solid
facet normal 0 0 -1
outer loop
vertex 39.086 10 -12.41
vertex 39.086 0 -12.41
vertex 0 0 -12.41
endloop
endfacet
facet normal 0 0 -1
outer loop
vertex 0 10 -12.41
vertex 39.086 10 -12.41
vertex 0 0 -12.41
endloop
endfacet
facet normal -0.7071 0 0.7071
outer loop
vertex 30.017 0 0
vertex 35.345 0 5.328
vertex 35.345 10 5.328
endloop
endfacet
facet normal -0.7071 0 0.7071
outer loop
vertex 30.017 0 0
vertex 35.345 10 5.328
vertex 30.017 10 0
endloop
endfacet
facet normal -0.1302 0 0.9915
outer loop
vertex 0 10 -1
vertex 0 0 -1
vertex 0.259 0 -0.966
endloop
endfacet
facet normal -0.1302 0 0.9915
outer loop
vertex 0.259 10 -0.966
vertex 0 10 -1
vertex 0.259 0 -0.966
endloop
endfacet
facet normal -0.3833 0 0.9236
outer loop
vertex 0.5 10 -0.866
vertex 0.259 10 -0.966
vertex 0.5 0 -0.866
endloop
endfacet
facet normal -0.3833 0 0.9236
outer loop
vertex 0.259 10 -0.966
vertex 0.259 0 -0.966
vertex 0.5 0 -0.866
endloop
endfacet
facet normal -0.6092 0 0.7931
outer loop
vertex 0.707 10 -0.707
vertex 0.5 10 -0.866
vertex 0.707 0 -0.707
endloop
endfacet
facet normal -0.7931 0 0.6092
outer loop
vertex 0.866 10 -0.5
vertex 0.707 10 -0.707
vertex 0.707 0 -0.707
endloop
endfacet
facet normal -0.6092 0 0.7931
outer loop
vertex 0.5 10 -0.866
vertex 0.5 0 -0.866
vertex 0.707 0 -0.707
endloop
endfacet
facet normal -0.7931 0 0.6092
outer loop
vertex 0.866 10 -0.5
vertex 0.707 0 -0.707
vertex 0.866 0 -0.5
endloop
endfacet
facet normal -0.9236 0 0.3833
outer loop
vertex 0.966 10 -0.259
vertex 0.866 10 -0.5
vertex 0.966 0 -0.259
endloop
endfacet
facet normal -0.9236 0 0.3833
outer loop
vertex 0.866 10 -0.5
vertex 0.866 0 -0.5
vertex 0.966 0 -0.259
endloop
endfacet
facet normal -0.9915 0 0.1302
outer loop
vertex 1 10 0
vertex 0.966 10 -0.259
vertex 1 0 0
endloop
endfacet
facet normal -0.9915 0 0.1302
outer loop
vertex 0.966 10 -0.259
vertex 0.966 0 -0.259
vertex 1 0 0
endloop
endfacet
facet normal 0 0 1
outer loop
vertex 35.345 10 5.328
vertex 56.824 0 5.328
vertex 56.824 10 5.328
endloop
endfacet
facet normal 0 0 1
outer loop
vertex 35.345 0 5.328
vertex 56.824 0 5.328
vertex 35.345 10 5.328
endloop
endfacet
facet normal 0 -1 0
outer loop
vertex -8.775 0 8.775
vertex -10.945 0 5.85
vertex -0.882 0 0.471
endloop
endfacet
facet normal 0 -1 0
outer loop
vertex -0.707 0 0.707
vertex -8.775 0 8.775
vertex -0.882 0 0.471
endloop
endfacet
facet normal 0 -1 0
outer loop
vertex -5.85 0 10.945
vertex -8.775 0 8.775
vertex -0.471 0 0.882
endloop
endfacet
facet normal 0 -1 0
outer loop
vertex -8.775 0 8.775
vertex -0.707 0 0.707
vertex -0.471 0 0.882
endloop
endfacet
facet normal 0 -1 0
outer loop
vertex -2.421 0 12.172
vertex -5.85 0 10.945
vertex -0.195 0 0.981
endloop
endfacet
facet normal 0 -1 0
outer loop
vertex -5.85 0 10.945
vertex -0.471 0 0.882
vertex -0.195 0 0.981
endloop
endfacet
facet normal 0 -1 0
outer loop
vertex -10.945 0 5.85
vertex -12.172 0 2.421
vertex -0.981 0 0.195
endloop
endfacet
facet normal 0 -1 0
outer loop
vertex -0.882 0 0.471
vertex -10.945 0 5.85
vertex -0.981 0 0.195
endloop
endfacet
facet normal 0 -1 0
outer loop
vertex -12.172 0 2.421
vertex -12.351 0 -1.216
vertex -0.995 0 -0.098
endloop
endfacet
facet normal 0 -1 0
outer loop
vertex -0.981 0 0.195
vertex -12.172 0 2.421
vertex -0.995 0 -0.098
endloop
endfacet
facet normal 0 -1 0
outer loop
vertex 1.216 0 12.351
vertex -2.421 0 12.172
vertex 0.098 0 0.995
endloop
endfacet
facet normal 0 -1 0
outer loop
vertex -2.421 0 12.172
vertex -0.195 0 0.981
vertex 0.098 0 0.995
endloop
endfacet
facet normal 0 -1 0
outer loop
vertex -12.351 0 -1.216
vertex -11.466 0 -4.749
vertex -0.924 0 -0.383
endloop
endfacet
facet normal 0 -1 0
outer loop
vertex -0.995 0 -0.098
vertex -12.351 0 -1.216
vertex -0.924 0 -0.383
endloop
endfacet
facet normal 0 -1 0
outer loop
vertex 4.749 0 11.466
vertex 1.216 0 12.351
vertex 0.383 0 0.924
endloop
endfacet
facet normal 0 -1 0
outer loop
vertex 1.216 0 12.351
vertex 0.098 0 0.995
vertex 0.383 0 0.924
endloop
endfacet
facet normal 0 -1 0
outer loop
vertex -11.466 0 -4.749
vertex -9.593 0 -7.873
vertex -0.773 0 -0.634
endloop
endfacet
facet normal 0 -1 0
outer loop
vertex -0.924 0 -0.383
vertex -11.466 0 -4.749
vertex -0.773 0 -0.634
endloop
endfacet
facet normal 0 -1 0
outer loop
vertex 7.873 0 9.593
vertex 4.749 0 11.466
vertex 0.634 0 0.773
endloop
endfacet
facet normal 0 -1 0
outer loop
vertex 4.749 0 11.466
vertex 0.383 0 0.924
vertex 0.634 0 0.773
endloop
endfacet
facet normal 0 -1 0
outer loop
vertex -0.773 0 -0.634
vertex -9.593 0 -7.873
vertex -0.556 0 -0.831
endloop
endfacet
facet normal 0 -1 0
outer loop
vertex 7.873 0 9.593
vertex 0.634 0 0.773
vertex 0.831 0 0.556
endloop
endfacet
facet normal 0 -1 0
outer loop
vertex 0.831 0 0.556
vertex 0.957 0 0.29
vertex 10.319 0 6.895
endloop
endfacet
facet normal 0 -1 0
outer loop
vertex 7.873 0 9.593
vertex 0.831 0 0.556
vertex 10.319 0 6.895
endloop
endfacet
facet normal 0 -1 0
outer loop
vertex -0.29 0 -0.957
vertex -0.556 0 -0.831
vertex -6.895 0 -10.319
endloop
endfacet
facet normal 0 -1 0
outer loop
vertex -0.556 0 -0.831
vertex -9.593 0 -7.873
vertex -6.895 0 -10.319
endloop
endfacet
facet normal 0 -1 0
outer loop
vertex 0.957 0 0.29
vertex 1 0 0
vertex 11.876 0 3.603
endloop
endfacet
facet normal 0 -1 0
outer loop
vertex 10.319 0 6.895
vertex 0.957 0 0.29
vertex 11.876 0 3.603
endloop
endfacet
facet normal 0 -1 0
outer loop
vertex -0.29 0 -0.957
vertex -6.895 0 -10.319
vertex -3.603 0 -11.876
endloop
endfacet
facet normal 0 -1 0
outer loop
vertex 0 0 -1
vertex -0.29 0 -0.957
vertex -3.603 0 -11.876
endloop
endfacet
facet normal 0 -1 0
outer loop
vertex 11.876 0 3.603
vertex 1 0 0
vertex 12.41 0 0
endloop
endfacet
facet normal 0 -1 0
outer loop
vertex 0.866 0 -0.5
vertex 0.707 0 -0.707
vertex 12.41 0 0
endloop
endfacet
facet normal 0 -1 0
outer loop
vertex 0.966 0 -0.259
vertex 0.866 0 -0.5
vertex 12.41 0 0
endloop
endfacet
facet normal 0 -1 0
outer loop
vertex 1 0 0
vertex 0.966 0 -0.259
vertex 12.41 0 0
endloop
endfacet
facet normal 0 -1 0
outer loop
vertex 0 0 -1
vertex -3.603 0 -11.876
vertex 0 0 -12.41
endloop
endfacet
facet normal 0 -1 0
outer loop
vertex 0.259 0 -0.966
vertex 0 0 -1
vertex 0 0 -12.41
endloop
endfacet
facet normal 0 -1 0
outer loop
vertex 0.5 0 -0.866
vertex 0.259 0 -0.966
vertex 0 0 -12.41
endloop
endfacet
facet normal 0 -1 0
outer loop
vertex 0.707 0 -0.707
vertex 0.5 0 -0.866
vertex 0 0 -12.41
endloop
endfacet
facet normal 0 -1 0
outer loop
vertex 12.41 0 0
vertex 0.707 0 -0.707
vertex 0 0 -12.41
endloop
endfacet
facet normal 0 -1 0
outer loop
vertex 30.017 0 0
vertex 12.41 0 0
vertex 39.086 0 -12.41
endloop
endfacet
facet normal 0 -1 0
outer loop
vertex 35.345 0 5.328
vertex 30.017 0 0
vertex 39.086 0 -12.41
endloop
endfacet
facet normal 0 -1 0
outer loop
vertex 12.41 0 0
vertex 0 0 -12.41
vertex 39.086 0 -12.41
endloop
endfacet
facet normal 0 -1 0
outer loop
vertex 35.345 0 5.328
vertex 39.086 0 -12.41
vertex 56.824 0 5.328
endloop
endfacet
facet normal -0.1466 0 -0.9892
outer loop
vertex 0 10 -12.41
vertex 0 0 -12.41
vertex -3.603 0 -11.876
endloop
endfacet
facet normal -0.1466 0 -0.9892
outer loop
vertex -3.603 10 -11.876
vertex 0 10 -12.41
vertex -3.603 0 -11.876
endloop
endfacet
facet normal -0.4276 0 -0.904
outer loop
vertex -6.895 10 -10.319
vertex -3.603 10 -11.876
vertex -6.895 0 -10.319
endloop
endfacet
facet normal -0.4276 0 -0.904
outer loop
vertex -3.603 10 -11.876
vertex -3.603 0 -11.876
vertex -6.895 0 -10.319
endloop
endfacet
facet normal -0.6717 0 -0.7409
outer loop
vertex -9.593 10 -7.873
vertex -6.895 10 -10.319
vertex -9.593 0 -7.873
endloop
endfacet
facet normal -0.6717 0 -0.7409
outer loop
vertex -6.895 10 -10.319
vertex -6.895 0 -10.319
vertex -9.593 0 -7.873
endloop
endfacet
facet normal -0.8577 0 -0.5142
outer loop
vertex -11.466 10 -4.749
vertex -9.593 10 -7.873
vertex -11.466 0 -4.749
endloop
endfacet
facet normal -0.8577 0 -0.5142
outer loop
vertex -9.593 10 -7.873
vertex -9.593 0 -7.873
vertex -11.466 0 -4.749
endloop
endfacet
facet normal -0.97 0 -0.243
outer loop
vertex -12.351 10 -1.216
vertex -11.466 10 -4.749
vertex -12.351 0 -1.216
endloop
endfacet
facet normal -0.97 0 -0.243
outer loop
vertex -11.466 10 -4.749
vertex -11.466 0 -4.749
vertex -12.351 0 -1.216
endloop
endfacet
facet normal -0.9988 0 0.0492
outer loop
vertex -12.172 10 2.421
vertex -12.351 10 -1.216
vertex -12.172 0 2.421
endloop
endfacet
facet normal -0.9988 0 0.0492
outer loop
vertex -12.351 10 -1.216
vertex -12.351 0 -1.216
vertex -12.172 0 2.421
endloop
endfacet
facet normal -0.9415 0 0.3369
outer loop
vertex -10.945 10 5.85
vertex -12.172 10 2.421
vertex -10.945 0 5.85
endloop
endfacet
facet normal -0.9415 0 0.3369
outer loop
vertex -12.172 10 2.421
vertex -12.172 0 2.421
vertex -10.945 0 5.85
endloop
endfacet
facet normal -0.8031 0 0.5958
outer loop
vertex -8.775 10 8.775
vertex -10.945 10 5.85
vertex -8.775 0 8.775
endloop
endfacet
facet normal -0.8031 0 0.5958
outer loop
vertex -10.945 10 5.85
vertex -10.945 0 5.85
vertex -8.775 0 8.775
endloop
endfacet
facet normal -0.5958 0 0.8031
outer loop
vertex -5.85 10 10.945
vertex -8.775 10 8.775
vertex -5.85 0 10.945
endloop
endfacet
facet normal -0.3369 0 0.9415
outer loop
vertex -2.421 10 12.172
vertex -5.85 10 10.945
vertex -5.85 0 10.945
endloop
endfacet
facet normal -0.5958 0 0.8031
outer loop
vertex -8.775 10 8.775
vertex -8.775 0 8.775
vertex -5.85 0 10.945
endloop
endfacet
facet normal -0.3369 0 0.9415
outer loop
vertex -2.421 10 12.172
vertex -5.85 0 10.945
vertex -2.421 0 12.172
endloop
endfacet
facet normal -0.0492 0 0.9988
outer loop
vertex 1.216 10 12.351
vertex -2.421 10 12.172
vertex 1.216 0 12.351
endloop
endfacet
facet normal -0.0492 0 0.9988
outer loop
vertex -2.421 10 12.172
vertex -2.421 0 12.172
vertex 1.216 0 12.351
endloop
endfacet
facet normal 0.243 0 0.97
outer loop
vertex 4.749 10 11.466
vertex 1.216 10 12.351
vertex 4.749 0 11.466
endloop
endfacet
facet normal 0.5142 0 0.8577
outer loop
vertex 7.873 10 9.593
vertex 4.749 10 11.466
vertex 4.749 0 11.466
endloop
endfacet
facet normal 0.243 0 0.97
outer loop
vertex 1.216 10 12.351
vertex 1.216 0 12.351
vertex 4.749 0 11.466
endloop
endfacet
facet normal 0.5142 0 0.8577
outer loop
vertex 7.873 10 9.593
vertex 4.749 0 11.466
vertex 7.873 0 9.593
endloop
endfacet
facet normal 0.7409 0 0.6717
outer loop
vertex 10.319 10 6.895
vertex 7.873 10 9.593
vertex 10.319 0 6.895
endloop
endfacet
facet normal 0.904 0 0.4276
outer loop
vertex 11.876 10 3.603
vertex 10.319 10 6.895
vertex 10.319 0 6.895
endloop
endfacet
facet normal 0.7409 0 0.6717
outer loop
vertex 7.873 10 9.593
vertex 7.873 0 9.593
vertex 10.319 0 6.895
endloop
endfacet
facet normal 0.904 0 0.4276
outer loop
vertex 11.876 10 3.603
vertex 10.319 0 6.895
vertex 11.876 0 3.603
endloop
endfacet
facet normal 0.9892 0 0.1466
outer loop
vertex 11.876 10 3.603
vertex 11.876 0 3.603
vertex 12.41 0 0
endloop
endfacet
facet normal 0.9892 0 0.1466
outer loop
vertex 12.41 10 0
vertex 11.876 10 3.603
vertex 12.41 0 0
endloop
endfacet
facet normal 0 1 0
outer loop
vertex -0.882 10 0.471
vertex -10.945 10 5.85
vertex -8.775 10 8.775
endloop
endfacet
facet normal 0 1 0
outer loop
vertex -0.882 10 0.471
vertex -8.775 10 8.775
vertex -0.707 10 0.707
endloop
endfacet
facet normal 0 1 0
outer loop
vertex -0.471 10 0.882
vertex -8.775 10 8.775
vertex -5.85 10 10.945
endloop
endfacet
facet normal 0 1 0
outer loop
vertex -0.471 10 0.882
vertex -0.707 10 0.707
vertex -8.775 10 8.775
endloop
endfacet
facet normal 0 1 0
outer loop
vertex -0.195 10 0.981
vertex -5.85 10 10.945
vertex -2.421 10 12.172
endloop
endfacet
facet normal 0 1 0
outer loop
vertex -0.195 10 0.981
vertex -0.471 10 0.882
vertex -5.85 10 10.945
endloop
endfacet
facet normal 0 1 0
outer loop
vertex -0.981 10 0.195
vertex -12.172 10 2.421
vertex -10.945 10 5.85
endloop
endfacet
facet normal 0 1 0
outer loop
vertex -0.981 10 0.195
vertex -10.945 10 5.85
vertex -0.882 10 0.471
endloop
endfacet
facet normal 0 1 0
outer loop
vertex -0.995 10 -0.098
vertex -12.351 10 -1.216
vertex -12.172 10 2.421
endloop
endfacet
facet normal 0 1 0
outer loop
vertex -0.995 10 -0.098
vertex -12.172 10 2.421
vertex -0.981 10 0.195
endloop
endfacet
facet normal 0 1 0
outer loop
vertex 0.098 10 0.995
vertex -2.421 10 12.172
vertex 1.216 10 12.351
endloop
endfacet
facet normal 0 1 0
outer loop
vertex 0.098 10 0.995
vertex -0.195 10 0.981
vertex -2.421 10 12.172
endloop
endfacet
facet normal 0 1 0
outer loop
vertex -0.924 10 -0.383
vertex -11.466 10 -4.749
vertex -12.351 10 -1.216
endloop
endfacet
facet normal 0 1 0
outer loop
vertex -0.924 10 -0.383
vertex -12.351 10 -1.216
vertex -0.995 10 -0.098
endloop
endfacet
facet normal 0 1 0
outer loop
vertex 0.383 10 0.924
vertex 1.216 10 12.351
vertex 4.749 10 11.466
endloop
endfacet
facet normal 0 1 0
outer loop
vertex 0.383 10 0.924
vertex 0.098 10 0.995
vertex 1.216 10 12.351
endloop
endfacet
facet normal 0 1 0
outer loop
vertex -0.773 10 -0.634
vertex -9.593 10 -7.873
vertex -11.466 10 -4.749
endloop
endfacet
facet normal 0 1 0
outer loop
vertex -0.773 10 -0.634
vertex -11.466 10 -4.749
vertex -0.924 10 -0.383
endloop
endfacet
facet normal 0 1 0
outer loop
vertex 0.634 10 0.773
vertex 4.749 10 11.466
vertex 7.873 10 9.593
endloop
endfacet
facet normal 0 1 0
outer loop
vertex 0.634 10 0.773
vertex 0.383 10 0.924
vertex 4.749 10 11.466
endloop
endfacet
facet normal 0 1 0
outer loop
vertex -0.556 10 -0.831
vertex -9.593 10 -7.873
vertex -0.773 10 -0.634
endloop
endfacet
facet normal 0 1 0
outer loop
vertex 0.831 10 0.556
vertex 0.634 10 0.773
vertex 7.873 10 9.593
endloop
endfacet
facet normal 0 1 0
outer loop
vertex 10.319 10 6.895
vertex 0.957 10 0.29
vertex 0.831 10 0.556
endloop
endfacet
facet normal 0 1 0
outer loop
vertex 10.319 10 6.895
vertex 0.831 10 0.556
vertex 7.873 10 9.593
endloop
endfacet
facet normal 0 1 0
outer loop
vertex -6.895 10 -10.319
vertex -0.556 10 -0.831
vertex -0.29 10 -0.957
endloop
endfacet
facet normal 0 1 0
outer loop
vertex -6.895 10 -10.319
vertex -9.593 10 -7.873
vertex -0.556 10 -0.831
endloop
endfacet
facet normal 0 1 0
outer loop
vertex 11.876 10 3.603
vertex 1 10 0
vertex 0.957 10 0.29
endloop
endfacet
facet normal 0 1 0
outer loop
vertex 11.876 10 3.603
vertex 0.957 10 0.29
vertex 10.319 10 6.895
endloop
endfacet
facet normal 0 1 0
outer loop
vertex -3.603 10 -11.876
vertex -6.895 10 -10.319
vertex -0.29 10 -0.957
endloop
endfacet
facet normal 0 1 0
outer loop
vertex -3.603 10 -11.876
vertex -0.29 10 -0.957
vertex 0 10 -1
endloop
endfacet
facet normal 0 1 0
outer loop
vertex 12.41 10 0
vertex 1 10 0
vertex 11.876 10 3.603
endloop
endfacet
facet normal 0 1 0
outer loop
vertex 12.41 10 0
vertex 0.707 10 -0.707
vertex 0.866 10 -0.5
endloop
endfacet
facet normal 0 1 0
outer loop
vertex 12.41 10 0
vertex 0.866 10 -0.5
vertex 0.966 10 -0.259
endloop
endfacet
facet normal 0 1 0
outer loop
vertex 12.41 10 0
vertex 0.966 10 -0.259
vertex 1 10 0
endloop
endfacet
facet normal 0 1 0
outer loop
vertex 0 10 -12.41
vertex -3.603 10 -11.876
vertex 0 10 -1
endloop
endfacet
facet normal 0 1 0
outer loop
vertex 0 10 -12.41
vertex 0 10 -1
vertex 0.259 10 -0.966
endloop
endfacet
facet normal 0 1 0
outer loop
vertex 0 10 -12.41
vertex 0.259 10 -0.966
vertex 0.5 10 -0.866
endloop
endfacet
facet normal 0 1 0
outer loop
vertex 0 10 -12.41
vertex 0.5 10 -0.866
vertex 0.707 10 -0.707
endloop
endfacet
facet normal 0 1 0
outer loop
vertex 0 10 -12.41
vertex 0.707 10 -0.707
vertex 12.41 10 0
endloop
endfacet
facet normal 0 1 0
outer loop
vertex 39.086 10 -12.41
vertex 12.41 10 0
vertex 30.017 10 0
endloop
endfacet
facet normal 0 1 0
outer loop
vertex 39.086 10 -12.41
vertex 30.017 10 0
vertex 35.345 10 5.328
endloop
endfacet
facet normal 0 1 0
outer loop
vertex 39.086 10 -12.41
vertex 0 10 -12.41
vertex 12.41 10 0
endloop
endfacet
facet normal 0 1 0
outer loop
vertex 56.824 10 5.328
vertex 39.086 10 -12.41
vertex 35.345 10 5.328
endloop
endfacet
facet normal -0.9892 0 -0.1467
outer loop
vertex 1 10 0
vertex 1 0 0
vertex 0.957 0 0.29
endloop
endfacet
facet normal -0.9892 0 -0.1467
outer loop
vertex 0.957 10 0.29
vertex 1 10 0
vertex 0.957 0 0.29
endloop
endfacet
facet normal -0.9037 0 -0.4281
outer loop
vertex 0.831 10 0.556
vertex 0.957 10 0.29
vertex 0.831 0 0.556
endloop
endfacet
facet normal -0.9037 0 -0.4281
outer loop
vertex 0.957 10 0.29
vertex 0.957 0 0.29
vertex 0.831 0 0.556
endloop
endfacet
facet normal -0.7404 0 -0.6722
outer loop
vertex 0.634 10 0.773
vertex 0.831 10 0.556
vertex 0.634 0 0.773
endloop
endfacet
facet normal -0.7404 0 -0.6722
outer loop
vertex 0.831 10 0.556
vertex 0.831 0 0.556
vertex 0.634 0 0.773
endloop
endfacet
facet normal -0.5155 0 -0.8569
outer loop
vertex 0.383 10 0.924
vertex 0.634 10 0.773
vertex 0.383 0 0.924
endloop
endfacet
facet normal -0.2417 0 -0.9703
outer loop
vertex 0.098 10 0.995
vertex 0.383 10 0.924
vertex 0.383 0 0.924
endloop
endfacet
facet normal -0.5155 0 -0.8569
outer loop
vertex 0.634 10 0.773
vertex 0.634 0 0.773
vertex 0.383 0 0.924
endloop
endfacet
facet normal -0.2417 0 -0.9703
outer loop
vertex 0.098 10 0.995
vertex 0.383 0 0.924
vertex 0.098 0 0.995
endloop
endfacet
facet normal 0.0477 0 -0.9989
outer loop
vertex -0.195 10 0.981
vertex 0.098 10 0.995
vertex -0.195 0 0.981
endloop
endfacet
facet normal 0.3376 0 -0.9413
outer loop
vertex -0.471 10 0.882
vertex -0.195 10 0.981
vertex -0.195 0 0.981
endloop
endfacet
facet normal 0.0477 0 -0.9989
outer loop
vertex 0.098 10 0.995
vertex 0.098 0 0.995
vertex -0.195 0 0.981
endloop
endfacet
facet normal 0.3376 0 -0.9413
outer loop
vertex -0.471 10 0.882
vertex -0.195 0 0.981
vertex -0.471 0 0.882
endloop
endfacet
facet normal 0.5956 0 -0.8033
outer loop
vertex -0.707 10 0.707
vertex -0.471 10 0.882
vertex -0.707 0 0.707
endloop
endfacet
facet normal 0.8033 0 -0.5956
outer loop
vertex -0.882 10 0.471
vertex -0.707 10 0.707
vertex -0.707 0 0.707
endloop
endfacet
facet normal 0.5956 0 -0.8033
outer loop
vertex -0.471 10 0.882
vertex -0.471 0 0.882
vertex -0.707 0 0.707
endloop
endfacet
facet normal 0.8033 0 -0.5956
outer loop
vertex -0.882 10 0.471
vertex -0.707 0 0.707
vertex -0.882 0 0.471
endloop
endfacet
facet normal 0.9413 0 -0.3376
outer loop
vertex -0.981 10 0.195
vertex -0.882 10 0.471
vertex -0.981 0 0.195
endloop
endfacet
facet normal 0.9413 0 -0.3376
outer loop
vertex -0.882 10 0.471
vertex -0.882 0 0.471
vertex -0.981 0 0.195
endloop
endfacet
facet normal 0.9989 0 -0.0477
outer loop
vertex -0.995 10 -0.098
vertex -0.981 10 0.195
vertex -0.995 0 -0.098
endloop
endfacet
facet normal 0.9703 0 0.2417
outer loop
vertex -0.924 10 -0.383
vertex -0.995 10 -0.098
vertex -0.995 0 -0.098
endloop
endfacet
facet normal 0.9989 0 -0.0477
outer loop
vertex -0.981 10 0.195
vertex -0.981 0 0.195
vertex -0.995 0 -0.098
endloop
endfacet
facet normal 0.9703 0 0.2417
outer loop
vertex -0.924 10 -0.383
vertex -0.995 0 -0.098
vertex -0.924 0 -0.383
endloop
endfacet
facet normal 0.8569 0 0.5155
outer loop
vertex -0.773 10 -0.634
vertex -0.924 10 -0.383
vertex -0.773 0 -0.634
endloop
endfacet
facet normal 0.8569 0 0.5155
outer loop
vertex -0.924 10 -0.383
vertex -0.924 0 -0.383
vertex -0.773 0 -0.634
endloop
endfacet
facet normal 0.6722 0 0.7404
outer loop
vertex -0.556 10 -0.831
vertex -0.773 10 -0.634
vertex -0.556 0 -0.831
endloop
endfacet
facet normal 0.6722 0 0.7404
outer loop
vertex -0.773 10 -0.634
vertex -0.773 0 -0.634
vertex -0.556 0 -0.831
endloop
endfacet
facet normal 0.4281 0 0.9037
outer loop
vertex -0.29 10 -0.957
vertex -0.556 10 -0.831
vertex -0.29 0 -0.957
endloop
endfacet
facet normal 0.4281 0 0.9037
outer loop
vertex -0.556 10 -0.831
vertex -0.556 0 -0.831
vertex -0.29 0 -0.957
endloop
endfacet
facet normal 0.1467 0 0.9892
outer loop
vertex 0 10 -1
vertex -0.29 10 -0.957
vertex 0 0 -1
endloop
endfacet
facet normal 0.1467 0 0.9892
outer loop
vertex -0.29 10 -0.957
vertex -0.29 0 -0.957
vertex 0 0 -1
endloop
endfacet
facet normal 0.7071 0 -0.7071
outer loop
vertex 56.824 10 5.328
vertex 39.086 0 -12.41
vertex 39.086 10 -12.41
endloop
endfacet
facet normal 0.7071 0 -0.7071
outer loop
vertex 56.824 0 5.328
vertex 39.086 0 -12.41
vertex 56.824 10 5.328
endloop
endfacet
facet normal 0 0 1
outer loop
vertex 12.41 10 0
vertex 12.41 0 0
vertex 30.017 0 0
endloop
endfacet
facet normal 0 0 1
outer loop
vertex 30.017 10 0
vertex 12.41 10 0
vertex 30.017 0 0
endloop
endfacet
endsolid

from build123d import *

# Parameters (mm, degrees)
BOSS_EXTRUDE2_DEPTH = 10


with BuildPart() as part:
    # Sketch1 → Boss-Extrude2 (new body)
    with BuildSketch(Plane(origin=(0, 0, 0), x_dir=(1, 0, 0), z_dir=(0, 1, 0))):
        with BuildLine():
            ThreePointArc((12.410397071, 0), (8.775475926, 8.775475926), (0, 12.410397071))
            Line((0, 12.410397071), (0, 1))
            ThreePointArc((0, 1), (0.707106781, 0.707106781), (1, 0))
            Line((1, 0), (12.410397071, 0))
        make_face()
        with BuildLine():
            Line((0, 1), (0, 12.410397071))
            ThreePointArc((0, 12.410397071), (-8.775475926, -8.775475926), (12.410397071, 0))
            Line((12.410397071, 0), (1, 0))
            ThreePointArc((1, 0), (-0.707106781, -0.707106781), (0, 1))
        make_face()
        with BuildLine():
            Line((30.017427339, 12.410397071), (0, 12.410397071))
            ThreePointArc((0, 12.410397071), (8.775475926, 8.775475926), (12.410397071, 0))
            Line((12.410397071, 0), (30.017427339, 0))
            Line((30.017427339, 0), (30.017427339, 12.410397071))
        make_face()
        Polygon((30.017427339, 0), (30.017427339, 12.410397071), (39.086451676, 12.410397071), (56.824436842, -5.327588094), (35.345015433, -5.327588094), align=None)
    extrude(amount=BOSS_EXTRUDE2_DEPTH)


solid = part.part
